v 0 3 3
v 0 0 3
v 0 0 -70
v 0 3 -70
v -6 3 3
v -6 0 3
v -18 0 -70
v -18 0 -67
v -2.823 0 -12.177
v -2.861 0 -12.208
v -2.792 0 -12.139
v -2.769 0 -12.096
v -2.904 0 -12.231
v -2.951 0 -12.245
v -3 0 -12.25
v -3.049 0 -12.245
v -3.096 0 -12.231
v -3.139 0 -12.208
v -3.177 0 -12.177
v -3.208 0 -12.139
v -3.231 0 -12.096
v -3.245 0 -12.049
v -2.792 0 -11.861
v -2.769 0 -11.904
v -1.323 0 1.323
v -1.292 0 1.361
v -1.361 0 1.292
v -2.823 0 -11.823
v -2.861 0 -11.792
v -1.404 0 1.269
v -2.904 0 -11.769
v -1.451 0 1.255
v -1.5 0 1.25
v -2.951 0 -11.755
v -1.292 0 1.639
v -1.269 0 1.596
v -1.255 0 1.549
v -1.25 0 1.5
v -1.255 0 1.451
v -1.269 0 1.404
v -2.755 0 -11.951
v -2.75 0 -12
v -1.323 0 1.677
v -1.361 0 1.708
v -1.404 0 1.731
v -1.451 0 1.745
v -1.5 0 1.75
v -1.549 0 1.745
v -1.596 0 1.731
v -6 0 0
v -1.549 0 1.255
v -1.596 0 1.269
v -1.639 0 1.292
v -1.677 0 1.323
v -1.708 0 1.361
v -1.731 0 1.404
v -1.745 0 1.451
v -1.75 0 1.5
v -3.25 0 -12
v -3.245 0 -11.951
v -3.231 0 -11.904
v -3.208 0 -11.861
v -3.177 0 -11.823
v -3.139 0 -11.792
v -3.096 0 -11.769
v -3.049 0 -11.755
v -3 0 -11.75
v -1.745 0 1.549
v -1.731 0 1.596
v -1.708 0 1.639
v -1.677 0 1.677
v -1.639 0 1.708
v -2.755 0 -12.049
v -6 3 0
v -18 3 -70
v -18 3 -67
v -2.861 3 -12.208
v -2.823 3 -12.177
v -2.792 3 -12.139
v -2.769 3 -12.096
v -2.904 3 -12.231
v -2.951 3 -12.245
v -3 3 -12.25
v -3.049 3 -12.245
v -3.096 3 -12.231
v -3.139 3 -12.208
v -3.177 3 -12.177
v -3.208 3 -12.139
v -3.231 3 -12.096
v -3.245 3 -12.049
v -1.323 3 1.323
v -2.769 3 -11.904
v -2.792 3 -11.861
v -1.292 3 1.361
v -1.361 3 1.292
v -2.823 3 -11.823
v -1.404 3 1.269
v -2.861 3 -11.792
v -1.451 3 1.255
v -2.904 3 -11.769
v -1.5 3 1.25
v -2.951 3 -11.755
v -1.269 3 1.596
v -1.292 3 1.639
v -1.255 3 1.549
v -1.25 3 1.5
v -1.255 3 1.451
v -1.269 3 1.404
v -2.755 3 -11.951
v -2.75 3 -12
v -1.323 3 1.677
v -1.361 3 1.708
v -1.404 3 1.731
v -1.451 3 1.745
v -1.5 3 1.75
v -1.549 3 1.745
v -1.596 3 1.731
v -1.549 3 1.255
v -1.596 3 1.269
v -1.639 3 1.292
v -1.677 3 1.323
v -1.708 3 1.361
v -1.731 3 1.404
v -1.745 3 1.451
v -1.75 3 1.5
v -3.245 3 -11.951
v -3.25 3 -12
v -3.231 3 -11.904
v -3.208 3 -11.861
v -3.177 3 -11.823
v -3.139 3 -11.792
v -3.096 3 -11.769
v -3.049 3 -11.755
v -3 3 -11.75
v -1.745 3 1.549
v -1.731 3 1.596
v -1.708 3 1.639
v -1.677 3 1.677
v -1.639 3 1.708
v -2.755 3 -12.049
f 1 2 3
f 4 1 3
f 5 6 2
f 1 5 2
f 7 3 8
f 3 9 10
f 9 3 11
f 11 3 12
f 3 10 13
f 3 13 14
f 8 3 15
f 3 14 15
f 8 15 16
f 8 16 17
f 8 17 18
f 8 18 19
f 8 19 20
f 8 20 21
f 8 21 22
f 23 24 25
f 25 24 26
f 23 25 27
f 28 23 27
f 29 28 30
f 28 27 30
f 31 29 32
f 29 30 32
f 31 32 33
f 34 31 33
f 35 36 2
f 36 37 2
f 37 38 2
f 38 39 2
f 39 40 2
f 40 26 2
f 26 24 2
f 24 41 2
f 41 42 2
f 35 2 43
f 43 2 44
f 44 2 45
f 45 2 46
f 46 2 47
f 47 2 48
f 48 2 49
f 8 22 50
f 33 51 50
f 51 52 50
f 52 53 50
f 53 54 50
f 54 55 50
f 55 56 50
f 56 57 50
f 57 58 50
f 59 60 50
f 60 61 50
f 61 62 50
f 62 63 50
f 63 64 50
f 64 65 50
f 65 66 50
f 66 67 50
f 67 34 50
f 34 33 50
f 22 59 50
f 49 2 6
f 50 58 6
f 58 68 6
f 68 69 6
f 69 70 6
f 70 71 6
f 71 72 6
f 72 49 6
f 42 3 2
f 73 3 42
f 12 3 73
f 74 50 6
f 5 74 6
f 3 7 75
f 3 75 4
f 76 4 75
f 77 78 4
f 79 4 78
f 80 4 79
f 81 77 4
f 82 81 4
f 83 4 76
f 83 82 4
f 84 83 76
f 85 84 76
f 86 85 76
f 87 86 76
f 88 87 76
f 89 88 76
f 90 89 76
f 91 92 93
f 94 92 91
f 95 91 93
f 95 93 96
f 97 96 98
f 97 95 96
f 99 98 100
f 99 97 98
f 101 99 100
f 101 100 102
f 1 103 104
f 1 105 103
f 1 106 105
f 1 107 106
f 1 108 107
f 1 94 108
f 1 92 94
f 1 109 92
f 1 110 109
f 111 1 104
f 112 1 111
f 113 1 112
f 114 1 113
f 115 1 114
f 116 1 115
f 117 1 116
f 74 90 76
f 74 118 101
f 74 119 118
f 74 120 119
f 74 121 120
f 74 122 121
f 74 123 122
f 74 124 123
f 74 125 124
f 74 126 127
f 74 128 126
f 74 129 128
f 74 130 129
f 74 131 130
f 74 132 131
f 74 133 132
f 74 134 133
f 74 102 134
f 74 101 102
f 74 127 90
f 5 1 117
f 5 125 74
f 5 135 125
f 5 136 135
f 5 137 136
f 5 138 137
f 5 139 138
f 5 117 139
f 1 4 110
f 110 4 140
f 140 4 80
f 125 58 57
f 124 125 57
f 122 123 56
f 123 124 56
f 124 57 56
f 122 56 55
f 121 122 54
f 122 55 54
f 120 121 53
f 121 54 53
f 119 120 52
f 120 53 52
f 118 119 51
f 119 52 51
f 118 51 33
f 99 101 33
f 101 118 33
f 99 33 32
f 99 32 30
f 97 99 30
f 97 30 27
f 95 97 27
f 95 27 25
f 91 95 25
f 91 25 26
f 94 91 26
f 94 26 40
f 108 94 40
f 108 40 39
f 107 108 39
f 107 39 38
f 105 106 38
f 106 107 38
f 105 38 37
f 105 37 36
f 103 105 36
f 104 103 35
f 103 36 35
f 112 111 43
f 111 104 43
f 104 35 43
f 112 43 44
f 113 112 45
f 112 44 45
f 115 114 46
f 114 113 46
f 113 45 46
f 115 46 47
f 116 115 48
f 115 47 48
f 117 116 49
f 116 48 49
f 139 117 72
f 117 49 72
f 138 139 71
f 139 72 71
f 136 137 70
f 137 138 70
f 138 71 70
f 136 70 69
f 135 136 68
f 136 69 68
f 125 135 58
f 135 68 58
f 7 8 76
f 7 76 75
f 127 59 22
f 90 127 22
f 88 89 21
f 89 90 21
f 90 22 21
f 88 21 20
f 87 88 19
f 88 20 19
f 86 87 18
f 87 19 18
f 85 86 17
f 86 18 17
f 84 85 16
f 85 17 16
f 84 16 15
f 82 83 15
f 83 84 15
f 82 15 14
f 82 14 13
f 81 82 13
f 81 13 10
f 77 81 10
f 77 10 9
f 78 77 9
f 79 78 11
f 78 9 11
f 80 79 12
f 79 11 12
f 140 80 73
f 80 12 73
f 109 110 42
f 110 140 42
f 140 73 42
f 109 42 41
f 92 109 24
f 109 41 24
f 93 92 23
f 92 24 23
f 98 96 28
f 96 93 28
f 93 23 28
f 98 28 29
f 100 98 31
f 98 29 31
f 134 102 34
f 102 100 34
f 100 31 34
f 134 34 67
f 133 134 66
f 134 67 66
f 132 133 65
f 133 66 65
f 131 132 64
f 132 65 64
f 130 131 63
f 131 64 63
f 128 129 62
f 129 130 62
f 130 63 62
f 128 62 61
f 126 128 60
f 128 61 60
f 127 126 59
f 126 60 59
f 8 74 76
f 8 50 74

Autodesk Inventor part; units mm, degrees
ref_plane "YZ Plane" through (0, 0, 0) normal (1, 0, 0) x (0, 1, 0)
ref_plane "XZ Plane" through (0, 0, 0) normal (0, 1, 0) x (-1, 0, 0)
ref_plane "XY Plane" through (0, 0, 0) normal (0, 0, 1) x (1, 0, 0)
sketch "草圖1" plane through (0, 0, 0) normal (0, 1, 0) x (-1, 0, 0)
  line L0 (0, 0) -> (6, 0)
  line L1 (6, 0) -> (6, -70)
  line L2 (6, -70) -> (0, -70)
  line L3 (0, -70) -> (0, 0)
  line L4 (0, 0) -> (6, 0)
  line L5 (6, 0) -> (6, 3)
  line L6 (6, 3) -> (0, 3)
  line L7 (0, 3) -> (0, 0)
  line L8 (6, 0) -> (18, -67)
  line L9 (18, -67) -> (18, -70)
  line L10 (18, -70) -> (6, -70)
  circle A0 centre (1.5, 1.5) radius 0.25
  circle A1 centre (3, -12) radius 0.25
  point P0 (6, 1.5)
  dimension "d0" = 70
  dimension "d1" = 6
  dimension "d2" = 3
  dimension "d5" = 12
  dimension "d6" = 3
  dimension "d7" = 0.5
  dimension "d8" = 0.5
  dimension "d9" = 15
  dimension "d10" = 3
extrude "擠出1" add sketch "草圖1" along normal blind 3
